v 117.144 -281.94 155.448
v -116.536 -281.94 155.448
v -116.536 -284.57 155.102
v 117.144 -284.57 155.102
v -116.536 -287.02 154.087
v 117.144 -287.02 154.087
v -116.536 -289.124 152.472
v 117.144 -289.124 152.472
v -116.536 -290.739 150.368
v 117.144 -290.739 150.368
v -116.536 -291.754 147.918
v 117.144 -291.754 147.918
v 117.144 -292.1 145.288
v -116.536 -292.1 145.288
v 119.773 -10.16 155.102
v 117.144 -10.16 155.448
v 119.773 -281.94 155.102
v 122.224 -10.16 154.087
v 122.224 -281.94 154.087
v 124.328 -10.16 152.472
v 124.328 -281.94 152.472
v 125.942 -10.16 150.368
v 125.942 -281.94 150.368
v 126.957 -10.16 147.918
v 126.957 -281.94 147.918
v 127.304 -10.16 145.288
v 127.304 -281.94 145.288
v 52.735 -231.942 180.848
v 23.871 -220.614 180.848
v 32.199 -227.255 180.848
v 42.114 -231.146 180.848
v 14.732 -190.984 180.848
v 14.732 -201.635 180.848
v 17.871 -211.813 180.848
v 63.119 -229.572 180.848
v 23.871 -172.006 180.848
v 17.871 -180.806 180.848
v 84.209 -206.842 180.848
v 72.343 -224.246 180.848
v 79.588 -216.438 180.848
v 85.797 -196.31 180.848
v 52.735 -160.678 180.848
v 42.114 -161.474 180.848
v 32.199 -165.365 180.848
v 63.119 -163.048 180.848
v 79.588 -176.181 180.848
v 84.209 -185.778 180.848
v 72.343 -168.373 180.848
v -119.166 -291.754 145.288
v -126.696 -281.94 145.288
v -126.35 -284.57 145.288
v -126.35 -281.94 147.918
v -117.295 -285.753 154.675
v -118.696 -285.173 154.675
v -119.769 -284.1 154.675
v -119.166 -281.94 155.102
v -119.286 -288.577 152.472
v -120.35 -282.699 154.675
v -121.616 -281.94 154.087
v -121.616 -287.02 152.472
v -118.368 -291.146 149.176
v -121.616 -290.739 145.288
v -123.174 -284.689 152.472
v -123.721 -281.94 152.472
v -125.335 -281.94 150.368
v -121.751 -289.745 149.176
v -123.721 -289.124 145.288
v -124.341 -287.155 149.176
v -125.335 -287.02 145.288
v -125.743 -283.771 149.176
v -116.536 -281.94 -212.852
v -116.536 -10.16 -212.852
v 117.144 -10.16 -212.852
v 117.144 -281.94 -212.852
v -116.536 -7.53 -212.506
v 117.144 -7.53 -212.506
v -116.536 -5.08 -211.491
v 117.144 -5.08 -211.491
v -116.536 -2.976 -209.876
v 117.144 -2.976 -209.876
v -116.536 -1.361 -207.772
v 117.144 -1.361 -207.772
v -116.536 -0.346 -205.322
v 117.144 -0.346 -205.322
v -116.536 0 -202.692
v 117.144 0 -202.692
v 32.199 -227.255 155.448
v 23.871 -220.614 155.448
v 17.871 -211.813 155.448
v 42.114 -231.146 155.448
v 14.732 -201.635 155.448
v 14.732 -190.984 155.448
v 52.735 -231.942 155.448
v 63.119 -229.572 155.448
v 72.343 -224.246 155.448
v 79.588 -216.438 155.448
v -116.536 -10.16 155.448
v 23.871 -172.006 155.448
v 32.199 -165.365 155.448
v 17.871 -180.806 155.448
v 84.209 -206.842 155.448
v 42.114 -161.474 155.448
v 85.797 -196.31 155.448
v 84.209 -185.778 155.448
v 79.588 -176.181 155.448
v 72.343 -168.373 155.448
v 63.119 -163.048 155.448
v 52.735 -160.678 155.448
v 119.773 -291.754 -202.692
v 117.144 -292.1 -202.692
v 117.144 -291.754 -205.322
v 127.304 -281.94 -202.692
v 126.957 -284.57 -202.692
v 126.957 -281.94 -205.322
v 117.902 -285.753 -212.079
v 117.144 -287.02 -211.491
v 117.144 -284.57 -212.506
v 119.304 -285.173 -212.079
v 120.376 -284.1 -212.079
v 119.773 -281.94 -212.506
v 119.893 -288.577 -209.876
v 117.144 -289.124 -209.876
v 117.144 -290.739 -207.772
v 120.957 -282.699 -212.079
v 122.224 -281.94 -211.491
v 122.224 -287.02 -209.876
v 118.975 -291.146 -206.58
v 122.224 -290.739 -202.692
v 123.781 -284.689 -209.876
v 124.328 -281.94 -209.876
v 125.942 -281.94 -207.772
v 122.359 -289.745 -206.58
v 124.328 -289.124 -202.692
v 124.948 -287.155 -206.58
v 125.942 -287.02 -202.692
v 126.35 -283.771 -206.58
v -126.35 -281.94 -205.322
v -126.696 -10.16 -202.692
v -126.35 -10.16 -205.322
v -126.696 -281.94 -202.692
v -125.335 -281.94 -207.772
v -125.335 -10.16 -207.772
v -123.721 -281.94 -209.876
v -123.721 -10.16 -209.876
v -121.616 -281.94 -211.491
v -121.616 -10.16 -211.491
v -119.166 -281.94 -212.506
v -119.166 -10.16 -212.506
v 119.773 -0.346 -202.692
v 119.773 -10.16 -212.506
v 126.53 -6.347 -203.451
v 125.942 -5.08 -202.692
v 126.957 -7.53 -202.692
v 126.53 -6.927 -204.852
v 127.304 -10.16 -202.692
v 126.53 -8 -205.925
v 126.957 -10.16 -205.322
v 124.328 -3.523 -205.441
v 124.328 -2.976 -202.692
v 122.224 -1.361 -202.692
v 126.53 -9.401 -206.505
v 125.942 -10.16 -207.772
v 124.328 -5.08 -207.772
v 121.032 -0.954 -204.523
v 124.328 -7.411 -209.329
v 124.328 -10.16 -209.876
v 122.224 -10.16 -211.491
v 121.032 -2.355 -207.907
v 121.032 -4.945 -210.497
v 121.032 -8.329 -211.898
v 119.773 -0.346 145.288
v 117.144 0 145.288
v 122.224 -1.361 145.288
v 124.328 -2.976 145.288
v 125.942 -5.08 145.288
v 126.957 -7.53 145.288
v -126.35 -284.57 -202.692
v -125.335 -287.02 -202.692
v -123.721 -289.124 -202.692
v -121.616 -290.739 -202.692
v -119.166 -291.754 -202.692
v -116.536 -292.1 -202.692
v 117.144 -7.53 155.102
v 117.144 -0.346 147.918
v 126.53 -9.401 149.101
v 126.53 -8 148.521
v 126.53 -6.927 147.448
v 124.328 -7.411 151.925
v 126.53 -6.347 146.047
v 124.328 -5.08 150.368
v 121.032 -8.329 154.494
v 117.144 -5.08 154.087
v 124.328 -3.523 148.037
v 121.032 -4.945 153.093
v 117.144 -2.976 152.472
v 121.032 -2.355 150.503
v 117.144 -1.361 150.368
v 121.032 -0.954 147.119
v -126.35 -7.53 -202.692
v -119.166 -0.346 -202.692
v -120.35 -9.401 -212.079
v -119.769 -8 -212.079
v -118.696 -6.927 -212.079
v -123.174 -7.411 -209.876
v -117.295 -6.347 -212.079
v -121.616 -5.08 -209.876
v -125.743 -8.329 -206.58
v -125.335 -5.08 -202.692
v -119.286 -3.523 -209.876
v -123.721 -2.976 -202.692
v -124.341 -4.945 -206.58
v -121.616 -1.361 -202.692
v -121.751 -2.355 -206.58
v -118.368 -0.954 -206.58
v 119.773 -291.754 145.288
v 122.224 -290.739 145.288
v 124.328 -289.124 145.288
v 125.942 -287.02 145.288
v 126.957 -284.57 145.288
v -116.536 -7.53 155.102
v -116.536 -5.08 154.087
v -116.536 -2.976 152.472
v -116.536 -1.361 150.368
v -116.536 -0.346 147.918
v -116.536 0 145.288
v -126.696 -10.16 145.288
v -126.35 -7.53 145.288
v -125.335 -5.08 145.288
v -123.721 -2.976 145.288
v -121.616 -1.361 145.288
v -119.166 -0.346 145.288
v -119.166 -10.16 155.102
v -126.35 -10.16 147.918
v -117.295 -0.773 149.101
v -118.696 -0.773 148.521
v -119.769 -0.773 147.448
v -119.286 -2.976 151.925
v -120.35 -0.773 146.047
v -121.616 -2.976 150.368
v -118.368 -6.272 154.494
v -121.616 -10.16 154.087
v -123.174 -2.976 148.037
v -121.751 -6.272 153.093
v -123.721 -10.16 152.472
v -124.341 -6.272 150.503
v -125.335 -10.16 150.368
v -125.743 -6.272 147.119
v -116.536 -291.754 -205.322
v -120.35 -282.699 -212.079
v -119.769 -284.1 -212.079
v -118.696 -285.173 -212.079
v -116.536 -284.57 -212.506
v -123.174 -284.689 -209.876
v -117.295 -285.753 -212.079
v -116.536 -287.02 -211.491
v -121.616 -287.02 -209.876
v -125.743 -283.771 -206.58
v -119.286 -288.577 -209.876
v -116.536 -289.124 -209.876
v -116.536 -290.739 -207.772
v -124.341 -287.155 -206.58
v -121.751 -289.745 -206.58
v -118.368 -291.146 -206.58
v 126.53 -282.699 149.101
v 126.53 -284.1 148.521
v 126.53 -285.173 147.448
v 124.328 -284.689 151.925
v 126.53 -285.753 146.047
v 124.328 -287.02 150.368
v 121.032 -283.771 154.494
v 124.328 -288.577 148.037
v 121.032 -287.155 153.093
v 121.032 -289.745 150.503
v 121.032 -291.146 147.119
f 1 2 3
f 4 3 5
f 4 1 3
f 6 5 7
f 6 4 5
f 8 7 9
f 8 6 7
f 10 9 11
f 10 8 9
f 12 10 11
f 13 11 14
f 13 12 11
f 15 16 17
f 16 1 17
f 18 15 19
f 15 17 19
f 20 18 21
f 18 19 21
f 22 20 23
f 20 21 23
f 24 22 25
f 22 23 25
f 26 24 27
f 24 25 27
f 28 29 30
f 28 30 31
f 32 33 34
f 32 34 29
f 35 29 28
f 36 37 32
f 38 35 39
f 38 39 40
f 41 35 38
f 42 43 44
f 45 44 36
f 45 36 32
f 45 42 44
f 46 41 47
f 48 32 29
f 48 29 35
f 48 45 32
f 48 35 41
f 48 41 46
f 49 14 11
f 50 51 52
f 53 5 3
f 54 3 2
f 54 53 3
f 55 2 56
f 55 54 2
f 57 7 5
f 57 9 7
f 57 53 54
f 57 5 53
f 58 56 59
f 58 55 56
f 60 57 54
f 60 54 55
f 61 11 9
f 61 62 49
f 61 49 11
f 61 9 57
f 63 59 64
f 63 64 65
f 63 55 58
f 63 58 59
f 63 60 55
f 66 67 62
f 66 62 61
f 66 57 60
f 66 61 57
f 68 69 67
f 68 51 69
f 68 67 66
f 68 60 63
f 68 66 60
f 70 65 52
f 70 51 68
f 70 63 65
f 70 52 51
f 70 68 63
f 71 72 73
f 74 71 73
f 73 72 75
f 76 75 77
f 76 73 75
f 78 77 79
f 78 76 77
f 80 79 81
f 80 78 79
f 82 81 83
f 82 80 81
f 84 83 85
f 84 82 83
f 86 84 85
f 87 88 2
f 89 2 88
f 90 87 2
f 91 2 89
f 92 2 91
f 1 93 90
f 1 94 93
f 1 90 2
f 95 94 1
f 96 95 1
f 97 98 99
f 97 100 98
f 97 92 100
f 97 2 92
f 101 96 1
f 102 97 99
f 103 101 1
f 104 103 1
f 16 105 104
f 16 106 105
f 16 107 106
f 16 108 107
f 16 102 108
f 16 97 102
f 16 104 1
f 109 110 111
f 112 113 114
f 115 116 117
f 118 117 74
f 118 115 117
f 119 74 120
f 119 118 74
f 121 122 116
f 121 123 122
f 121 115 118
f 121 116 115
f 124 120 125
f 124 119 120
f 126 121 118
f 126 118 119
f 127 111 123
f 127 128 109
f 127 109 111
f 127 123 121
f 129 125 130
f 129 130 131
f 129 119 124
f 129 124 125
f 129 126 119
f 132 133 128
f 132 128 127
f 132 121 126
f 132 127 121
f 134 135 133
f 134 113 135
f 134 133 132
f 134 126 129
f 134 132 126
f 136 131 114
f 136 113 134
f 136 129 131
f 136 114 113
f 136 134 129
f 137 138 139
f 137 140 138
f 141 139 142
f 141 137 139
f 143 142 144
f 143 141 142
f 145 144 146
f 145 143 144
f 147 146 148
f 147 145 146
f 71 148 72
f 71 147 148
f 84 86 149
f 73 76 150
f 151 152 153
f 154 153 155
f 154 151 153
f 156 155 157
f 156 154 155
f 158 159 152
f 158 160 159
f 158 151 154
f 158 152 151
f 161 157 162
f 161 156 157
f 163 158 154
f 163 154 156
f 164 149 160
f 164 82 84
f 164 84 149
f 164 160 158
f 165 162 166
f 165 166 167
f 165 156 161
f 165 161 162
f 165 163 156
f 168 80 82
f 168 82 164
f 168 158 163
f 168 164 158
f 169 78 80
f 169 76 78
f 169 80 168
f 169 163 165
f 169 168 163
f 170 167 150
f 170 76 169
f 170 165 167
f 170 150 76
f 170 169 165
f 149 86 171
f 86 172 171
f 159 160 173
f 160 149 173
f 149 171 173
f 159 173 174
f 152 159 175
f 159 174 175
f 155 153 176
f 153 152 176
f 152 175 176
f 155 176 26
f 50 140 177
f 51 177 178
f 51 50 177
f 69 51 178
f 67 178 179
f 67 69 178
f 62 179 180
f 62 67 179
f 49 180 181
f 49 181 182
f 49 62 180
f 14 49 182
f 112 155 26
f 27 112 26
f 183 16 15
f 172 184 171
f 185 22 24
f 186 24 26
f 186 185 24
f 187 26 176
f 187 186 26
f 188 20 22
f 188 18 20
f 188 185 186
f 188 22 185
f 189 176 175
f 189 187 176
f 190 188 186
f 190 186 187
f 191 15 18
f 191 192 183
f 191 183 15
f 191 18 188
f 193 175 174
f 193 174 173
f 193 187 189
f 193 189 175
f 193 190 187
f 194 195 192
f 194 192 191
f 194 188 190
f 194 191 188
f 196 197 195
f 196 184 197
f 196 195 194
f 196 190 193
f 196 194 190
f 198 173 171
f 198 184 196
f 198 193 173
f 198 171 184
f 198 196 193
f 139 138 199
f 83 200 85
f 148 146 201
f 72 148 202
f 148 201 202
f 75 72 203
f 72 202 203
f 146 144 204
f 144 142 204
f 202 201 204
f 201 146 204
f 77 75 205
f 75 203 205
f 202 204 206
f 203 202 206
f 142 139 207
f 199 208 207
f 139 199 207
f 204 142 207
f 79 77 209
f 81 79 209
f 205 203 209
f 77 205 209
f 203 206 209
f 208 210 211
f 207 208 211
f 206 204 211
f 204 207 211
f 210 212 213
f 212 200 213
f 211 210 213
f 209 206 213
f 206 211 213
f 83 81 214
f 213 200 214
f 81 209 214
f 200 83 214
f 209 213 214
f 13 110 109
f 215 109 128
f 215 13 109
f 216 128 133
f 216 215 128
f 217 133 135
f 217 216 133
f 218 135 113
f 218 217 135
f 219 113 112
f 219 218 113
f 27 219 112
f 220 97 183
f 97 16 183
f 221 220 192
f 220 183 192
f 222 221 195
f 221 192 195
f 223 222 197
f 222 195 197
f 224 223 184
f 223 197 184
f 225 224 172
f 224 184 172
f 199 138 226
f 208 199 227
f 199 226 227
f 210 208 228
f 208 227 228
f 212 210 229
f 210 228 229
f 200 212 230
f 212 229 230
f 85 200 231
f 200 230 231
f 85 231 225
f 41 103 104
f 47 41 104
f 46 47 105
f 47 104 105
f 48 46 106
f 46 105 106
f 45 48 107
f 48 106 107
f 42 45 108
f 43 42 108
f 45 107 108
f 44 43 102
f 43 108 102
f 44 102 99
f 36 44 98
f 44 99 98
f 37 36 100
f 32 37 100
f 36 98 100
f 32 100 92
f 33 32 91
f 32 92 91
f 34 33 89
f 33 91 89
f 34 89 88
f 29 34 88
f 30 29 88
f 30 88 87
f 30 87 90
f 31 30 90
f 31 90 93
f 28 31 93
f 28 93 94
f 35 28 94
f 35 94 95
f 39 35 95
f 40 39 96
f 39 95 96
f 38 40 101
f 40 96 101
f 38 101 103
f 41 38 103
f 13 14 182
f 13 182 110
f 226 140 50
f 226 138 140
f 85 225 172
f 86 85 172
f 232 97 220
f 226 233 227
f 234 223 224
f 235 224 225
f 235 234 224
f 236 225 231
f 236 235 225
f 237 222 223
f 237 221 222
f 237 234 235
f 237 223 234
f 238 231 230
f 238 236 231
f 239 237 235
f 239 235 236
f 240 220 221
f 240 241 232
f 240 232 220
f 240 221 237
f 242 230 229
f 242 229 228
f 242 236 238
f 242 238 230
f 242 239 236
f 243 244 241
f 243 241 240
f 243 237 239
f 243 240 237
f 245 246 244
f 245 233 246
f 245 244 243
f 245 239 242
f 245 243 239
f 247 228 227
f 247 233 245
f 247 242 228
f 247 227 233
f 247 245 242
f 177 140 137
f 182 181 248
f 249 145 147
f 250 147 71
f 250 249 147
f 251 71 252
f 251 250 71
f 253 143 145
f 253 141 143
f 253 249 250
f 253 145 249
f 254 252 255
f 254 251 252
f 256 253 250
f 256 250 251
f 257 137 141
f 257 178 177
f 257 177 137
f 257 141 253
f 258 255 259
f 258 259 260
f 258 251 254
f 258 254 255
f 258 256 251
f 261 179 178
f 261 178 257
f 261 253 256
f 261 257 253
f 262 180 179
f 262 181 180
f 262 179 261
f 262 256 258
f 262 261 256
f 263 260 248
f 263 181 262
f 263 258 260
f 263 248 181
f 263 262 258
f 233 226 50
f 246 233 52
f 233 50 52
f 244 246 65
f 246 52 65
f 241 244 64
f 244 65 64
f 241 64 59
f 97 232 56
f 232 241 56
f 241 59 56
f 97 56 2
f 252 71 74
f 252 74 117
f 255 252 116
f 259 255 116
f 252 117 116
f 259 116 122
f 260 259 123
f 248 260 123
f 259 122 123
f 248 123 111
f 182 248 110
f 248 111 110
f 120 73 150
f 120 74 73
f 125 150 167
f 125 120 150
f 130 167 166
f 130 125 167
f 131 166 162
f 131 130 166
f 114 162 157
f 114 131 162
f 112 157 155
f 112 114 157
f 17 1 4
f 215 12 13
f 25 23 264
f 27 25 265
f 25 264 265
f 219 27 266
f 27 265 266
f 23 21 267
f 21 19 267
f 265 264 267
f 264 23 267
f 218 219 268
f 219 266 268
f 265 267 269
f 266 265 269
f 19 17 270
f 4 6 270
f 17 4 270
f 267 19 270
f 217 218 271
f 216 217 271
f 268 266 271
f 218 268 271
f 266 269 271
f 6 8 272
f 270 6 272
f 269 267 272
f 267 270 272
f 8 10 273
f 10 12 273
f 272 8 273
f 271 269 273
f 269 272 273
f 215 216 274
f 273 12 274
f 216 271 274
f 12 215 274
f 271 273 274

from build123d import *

# Parameters (mm, degrees)
F0_W     = 254
F0_H     = 368.3
F1_DEPTH = 292.1
F2_R     = 35.73197
F3_DEPTH = 25.4
F4_R     = 10.16


with BuildPart() as f1:
    # F0 (on Front) → F1 (new body)
    with BuildSketch(Plane.XZ):
        with Locations((0.303643, -28.702023)):
            Rectangle(F0_W, F0_H)
    extrude(amount=F1_DEPTH)

    # F2 (on face) → F3 (join)
    with BuildSketch(Plane.XY.offset(155.447977)):
        with Locations((50.064862, -196.309745)):
            Circle(F2_R)
    extrude(amount=F3_DEPTH)

    # F4
    f4_edges = [f1.edges().sort_by_distance(p)[0] for p in [
        (-126.696357, -292.1, -28.702023),
        (0.303643, -292.1, 155.447977),
        (-126.696357, -146.05, 155.447977),
        (0.303643, 0, 155.447977),
        (127.303643, -146.05, 155.447977),
        (-126.696357, 0, -28.702023),
        (-126.696357, -146.05, -212.852023),
        (0.303643, 0, -212.852023),
        (127.303643, 0, -28.702023),
        (127.303643, -292.1, -28.702023),
        (0.303643, -292.1, -212.852023),
        (127.303643, -146.05, -212.852023),
    ]]
    fillet(f4_edges, radius=F4_R)


solid = f1.part
